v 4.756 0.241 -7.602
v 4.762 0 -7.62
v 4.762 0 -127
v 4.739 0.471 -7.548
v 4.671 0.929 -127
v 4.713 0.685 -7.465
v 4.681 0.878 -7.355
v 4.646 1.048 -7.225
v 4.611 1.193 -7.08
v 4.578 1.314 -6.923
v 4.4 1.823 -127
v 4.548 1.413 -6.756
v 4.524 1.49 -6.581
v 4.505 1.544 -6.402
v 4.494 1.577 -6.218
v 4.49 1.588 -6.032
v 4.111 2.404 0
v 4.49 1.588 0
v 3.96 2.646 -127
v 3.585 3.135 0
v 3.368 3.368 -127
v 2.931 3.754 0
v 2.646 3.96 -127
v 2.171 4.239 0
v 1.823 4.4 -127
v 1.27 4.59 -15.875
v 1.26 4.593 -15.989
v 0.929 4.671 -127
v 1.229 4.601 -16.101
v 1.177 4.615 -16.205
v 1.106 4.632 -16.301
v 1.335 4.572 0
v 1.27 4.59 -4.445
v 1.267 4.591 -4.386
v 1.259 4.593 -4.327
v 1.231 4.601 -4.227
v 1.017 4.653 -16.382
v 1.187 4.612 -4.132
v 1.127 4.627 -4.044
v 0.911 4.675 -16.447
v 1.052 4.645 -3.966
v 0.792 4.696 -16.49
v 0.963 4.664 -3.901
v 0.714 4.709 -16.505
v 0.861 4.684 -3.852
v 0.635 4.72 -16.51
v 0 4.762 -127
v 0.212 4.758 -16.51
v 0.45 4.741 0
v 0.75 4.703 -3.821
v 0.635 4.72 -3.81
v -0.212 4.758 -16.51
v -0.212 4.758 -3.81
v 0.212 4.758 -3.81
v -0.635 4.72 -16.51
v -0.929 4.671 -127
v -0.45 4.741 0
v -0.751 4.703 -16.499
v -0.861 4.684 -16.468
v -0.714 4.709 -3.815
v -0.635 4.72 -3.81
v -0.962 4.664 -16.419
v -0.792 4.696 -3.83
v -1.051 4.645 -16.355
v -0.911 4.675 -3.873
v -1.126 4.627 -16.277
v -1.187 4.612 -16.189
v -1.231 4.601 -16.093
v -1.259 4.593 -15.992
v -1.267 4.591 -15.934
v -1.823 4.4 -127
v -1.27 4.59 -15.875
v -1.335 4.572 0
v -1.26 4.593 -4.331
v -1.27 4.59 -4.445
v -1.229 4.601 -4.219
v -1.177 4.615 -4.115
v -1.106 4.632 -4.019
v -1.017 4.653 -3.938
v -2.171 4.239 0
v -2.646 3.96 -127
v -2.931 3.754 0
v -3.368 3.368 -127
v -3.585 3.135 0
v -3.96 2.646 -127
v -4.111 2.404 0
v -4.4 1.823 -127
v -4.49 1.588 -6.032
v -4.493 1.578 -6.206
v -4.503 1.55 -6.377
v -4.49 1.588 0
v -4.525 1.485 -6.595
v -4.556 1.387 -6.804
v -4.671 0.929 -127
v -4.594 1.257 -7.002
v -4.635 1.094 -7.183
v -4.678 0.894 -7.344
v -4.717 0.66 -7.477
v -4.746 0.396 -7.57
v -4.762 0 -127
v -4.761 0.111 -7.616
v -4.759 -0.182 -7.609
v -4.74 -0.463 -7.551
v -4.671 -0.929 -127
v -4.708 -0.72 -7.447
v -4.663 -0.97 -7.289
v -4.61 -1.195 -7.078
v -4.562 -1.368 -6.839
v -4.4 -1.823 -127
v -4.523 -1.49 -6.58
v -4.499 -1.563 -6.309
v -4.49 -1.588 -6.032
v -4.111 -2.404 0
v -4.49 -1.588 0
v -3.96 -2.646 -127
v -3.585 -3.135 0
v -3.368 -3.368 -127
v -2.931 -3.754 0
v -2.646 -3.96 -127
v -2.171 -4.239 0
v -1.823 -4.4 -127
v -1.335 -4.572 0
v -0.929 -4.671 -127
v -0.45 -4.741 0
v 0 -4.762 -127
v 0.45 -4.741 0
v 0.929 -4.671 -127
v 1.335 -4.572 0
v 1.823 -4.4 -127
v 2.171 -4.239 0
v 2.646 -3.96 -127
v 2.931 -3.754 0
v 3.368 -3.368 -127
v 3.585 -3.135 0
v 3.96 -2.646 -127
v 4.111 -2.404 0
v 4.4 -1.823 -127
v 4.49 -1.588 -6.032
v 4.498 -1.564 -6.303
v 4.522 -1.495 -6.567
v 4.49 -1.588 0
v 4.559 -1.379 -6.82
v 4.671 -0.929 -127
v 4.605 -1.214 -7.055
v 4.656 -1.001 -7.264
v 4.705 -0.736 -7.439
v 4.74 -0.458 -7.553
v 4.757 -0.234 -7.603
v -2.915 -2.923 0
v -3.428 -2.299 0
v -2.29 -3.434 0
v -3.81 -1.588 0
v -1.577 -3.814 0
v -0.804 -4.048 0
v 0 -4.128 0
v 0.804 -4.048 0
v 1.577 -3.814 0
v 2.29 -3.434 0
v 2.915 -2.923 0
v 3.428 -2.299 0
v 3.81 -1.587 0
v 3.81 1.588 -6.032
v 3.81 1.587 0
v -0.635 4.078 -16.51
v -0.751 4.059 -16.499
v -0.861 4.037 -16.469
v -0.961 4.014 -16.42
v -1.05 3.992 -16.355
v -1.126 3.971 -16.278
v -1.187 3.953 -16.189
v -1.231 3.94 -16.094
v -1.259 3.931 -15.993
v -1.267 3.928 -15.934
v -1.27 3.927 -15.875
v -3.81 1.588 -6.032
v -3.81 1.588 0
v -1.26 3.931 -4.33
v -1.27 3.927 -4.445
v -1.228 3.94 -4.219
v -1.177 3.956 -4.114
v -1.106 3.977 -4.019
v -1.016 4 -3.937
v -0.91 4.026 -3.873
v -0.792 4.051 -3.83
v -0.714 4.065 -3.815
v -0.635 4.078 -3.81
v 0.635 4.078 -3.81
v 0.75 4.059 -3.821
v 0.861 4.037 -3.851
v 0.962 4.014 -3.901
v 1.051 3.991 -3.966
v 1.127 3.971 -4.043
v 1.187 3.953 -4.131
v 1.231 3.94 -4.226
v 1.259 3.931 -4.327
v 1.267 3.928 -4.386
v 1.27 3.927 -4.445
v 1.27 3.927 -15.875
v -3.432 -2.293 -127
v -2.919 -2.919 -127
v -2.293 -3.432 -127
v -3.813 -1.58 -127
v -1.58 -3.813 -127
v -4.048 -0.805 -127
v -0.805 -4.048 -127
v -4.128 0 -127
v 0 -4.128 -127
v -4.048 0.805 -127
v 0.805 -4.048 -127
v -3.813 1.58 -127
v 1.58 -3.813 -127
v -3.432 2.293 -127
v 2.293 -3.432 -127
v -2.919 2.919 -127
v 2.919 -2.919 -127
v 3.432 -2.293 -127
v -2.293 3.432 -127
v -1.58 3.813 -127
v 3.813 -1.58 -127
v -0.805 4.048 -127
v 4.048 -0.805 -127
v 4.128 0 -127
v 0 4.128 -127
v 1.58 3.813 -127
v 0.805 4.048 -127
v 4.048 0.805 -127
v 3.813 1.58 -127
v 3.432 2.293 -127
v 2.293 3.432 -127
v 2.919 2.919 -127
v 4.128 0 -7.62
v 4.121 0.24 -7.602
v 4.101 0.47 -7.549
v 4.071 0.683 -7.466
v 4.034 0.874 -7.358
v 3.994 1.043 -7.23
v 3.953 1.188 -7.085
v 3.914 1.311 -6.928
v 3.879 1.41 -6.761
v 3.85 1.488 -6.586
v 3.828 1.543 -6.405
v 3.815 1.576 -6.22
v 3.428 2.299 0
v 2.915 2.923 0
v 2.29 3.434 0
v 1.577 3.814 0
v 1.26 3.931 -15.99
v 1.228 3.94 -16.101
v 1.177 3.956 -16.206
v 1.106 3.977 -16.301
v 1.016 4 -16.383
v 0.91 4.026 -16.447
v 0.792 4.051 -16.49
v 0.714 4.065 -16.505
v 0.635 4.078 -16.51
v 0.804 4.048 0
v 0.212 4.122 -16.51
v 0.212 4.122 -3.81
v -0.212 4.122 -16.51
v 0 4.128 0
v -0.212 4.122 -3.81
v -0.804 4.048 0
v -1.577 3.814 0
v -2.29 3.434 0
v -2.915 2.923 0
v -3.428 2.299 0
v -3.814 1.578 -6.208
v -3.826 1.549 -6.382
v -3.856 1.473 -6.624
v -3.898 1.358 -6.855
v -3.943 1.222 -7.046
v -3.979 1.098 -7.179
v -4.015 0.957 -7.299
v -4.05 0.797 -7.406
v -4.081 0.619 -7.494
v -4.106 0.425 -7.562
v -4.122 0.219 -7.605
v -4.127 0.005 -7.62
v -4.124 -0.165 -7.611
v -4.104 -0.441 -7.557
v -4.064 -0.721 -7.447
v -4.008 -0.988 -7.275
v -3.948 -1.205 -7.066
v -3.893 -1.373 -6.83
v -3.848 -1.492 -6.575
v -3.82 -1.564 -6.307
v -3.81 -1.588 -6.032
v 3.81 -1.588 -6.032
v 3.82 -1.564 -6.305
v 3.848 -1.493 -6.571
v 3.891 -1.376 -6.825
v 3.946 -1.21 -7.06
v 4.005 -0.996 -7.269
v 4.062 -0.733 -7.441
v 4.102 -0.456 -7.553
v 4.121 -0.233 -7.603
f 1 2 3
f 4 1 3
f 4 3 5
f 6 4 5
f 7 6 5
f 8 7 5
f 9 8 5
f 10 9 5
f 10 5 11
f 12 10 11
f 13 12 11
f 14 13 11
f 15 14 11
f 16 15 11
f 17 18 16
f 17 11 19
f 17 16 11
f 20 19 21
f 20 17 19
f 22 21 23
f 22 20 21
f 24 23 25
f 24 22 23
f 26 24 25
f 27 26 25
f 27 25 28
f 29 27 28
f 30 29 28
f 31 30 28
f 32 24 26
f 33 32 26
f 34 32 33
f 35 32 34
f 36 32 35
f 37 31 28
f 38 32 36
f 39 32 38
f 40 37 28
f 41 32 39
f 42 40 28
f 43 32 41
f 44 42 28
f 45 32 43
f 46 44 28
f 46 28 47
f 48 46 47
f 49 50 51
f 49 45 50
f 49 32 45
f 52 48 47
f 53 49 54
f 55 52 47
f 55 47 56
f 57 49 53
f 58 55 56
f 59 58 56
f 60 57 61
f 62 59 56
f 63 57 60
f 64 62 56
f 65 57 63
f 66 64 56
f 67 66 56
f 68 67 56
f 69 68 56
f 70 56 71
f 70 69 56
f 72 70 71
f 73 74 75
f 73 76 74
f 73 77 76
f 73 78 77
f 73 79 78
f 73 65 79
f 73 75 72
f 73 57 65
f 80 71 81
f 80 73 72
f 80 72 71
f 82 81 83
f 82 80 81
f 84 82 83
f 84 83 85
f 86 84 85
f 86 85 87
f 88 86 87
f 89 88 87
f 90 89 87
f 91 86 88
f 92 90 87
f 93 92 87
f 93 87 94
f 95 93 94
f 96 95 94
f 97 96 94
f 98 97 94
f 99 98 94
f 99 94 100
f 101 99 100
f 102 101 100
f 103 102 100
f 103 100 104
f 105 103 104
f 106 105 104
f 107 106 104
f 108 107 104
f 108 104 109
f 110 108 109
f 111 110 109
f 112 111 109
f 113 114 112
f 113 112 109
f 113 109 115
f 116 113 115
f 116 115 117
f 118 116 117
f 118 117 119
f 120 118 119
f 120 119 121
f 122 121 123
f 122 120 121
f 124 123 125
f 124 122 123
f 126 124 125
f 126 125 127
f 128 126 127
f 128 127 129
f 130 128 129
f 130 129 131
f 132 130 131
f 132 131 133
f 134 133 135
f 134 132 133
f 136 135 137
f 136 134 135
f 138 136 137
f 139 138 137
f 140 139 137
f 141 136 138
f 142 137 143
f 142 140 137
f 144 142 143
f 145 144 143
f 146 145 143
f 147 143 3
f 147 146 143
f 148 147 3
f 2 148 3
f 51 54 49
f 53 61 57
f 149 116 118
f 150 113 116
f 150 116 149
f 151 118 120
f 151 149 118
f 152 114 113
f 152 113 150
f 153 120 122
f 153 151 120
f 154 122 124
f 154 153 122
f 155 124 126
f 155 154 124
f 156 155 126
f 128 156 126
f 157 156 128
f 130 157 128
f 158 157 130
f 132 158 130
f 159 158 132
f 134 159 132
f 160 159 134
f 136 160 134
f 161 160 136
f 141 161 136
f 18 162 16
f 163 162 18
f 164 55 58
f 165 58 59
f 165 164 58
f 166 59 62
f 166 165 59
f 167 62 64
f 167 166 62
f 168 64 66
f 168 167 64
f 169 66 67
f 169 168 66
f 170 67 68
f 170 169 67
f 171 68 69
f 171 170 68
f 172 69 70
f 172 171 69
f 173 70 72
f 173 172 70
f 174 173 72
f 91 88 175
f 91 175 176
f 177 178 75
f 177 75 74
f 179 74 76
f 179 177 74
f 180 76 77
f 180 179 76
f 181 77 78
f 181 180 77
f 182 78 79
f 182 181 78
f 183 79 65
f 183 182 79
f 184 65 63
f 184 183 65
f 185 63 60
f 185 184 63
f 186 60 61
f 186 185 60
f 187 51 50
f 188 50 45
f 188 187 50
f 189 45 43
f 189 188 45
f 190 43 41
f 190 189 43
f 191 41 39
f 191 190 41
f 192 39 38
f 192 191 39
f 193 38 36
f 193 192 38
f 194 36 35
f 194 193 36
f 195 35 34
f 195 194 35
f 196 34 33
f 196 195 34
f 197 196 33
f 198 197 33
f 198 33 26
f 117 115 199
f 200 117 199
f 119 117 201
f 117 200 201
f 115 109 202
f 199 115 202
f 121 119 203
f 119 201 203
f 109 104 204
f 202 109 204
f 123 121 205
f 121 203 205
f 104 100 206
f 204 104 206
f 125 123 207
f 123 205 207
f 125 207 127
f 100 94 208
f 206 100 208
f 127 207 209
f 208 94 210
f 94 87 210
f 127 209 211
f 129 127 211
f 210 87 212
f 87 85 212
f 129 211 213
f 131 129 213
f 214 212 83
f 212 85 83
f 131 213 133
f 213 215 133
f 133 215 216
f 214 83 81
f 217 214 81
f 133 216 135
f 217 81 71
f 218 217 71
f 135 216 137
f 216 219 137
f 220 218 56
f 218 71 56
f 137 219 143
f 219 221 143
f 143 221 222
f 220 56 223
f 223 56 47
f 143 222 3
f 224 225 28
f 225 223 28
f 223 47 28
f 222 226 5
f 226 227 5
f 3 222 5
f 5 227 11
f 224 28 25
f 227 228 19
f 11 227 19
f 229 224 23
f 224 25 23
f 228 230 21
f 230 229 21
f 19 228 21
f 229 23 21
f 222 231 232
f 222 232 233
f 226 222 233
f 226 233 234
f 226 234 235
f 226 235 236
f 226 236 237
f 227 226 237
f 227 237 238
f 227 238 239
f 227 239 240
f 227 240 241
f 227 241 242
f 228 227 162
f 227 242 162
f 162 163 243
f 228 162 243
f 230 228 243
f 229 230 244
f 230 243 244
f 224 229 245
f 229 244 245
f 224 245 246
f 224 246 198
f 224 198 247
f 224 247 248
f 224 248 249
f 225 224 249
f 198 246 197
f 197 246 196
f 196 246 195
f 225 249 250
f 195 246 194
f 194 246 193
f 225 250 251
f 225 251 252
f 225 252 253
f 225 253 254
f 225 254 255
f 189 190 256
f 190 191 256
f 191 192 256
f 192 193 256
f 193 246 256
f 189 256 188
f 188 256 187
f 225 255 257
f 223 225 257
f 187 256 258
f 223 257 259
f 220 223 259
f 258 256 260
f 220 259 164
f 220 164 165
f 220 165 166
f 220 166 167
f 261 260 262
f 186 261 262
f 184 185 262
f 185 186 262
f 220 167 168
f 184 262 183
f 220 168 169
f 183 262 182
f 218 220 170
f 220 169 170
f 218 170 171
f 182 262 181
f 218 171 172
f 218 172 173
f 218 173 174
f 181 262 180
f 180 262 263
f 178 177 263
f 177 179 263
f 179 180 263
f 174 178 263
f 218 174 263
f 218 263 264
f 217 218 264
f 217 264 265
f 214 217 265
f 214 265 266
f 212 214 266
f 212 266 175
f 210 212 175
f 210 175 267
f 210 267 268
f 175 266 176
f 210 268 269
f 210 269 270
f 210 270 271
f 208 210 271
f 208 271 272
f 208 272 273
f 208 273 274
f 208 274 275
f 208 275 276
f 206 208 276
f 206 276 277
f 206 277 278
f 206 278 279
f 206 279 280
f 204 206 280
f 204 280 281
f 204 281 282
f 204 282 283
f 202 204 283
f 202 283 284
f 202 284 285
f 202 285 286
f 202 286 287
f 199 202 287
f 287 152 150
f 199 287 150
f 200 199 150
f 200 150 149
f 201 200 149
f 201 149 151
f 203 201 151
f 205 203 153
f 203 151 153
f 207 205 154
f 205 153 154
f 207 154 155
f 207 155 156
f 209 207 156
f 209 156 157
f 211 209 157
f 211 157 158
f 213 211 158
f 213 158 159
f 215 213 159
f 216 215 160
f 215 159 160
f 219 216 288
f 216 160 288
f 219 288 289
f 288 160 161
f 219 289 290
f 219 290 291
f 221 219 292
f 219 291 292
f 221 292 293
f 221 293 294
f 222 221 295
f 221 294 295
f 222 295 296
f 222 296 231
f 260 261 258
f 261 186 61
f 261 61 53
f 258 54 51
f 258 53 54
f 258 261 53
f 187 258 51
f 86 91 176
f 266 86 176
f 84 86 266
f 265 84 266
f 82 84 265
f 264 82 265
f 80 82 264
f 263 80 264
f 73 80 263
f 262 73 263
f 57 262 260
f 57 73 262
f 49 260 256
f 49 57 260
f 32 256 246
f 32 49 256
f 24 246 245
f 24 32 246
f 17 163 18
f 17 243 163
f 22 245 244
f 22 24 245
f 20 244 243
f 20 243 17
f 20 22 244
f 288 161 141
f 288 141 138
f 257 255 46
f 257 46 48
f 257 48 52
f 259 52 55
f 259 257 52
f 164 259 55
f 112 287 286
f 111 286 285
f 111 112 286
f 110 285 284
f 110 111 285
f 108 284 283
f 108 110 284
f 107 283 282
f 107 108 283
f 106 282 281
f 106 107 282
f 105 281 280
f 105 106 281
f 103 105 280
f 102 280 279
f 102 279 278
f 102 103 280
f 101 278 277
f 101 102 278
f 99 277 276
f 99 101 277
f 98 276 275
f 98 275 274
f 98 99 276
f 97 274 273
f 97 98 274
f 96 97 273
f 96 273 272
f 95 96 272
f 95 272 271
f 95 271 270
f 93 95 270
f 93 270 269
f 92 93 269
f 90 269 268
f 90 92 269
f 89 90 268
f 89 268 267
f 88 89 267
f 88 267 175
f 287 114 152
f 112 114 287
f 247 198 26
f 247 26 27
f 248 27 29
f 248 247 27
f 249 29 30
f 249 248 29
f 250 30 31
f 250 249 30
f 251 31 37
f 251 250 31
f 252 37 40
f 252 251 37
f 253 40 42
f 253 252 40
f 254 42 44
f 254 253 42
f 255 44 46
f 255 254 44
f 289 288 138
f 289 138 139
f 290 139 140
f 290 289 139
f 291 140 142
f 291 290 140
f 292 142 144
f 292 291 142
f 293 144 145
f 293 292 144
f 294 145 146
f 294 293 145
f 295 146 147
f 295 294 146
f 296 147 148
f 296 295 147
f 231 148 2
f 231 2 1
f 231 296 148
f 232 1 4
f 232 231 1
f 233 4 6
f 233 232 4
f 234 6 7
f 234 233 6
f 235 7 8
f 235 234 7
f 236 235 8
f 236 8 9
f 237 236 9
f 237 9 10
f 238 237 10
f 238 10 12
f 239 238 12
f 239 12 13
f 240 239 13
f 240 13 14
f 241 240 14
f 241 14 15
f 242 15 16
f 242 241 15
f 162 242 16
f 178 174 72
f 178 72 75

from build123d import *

# Parameters (mm, degrees)
SKETCH1_R               = 4.7625
SKETCH1_R_2             = 4.1275
SHAFTBODY_DEPTH         = 127
SIDECUTS_DEPTH          = 128.178468353
SIDECUTS_DEPTH_BACK     = 128.178468353
CUT_EXTRUDE2_REACH      = 129.178
CUT_EXTRUDE2_END_RADIUS = 4.7625


with BuildPart() as part:
    # Sketch1 → ShaftBody (new body)
    with BuildSketch(Plane.XY):
        Circle(SKETCH1_R)
        Circle(SKETCH1_R_2, mode=Mode.SUBTRACT)
    extrude(amount=-SHAFTBODY_DEPTH)

    # Sketch6 → SideCuts (cut, two sides: drawn at the far end of the back side and taken through both)
    with BuildSketch(Plane(origin=(0, 0, 0), x_dir=(0, 0, -1), z_dir=(1, 0, 0)).offset(-SIDECUTS_DEPTH_BACK)):
        with BuildLine():
            Line((6.0325, 1.5875), (0, 1.5875))
            Line((0, 1.5875), (0, -1.5875))
            Line((0, -1.5875), (6.0325, -1.5875))
            ThreePointArc((6.0325, -1.5875), (7.62, 0), (6.0325, 1.5875))
        make_face()
    extrude(amount=SIDECUTS_DEPTH + SIDECUTS_DEPTH_BACK, mode=Mode.SUBTRACT)

    # Cut-Extrude2: up to this cylinder (the profile starts inside it)
    cut_extrude2_end = Plane(origin=(0, 0, -10.16), z_dir=(0, 0, 1)) * Cylinder(CUT_EXTRUDE2_END_RADIUS, 268.881, mode=Mode.PRIVATE)
    # Sketch7 → Cut-Extrude2 (cut, up to the surface)
    with BuildSketch(Plane(origin=(0, 0, 0), x_dir=(1, 0, 0), z_dir=(0, 1, 0)), mode=Mode.PRIVATE) as cut_extrude2_sk1:
        with BuildLine():
            Line((-0.635, 3.81), (0.635, 3.81))
            ThreePointArc((0.635, 3.81), (1.084012806, 3.995987194), (1.27, 4.445))
            Line((1.27, 4.445), (1.27, 15.875))
            ThreePointArc((1.27, 15.875), (1.084012806, 16.324012806), (0.635, 16.51))
            Line((0.635, 16.51), (-0.635, 16.51))
            ThreePointArc((-0.635, 16.51), (-1.084012806, 16.324012806), (-1.27, 15.875))
            Line((-1.27, 15.875), (-1.27, 4.445))
            ThreePointArc((-1.27, 4.445), (-1.084012806, 3.995987194), (-0.635, 3.81))
        make_face()
    cut_extrude2_tool1 = extrude(cut_extrude2_sk1.sketch, amount=CUT_EXTRUDE2_REACH, mode=Mode.PRIVATE) & cut_extrude2_end
    add(cut_extrude2_tool1.solids().sort_by_distance((0, 0, -10.16))[0], mode=Mode.SUBTRACT)


solid = part.part
